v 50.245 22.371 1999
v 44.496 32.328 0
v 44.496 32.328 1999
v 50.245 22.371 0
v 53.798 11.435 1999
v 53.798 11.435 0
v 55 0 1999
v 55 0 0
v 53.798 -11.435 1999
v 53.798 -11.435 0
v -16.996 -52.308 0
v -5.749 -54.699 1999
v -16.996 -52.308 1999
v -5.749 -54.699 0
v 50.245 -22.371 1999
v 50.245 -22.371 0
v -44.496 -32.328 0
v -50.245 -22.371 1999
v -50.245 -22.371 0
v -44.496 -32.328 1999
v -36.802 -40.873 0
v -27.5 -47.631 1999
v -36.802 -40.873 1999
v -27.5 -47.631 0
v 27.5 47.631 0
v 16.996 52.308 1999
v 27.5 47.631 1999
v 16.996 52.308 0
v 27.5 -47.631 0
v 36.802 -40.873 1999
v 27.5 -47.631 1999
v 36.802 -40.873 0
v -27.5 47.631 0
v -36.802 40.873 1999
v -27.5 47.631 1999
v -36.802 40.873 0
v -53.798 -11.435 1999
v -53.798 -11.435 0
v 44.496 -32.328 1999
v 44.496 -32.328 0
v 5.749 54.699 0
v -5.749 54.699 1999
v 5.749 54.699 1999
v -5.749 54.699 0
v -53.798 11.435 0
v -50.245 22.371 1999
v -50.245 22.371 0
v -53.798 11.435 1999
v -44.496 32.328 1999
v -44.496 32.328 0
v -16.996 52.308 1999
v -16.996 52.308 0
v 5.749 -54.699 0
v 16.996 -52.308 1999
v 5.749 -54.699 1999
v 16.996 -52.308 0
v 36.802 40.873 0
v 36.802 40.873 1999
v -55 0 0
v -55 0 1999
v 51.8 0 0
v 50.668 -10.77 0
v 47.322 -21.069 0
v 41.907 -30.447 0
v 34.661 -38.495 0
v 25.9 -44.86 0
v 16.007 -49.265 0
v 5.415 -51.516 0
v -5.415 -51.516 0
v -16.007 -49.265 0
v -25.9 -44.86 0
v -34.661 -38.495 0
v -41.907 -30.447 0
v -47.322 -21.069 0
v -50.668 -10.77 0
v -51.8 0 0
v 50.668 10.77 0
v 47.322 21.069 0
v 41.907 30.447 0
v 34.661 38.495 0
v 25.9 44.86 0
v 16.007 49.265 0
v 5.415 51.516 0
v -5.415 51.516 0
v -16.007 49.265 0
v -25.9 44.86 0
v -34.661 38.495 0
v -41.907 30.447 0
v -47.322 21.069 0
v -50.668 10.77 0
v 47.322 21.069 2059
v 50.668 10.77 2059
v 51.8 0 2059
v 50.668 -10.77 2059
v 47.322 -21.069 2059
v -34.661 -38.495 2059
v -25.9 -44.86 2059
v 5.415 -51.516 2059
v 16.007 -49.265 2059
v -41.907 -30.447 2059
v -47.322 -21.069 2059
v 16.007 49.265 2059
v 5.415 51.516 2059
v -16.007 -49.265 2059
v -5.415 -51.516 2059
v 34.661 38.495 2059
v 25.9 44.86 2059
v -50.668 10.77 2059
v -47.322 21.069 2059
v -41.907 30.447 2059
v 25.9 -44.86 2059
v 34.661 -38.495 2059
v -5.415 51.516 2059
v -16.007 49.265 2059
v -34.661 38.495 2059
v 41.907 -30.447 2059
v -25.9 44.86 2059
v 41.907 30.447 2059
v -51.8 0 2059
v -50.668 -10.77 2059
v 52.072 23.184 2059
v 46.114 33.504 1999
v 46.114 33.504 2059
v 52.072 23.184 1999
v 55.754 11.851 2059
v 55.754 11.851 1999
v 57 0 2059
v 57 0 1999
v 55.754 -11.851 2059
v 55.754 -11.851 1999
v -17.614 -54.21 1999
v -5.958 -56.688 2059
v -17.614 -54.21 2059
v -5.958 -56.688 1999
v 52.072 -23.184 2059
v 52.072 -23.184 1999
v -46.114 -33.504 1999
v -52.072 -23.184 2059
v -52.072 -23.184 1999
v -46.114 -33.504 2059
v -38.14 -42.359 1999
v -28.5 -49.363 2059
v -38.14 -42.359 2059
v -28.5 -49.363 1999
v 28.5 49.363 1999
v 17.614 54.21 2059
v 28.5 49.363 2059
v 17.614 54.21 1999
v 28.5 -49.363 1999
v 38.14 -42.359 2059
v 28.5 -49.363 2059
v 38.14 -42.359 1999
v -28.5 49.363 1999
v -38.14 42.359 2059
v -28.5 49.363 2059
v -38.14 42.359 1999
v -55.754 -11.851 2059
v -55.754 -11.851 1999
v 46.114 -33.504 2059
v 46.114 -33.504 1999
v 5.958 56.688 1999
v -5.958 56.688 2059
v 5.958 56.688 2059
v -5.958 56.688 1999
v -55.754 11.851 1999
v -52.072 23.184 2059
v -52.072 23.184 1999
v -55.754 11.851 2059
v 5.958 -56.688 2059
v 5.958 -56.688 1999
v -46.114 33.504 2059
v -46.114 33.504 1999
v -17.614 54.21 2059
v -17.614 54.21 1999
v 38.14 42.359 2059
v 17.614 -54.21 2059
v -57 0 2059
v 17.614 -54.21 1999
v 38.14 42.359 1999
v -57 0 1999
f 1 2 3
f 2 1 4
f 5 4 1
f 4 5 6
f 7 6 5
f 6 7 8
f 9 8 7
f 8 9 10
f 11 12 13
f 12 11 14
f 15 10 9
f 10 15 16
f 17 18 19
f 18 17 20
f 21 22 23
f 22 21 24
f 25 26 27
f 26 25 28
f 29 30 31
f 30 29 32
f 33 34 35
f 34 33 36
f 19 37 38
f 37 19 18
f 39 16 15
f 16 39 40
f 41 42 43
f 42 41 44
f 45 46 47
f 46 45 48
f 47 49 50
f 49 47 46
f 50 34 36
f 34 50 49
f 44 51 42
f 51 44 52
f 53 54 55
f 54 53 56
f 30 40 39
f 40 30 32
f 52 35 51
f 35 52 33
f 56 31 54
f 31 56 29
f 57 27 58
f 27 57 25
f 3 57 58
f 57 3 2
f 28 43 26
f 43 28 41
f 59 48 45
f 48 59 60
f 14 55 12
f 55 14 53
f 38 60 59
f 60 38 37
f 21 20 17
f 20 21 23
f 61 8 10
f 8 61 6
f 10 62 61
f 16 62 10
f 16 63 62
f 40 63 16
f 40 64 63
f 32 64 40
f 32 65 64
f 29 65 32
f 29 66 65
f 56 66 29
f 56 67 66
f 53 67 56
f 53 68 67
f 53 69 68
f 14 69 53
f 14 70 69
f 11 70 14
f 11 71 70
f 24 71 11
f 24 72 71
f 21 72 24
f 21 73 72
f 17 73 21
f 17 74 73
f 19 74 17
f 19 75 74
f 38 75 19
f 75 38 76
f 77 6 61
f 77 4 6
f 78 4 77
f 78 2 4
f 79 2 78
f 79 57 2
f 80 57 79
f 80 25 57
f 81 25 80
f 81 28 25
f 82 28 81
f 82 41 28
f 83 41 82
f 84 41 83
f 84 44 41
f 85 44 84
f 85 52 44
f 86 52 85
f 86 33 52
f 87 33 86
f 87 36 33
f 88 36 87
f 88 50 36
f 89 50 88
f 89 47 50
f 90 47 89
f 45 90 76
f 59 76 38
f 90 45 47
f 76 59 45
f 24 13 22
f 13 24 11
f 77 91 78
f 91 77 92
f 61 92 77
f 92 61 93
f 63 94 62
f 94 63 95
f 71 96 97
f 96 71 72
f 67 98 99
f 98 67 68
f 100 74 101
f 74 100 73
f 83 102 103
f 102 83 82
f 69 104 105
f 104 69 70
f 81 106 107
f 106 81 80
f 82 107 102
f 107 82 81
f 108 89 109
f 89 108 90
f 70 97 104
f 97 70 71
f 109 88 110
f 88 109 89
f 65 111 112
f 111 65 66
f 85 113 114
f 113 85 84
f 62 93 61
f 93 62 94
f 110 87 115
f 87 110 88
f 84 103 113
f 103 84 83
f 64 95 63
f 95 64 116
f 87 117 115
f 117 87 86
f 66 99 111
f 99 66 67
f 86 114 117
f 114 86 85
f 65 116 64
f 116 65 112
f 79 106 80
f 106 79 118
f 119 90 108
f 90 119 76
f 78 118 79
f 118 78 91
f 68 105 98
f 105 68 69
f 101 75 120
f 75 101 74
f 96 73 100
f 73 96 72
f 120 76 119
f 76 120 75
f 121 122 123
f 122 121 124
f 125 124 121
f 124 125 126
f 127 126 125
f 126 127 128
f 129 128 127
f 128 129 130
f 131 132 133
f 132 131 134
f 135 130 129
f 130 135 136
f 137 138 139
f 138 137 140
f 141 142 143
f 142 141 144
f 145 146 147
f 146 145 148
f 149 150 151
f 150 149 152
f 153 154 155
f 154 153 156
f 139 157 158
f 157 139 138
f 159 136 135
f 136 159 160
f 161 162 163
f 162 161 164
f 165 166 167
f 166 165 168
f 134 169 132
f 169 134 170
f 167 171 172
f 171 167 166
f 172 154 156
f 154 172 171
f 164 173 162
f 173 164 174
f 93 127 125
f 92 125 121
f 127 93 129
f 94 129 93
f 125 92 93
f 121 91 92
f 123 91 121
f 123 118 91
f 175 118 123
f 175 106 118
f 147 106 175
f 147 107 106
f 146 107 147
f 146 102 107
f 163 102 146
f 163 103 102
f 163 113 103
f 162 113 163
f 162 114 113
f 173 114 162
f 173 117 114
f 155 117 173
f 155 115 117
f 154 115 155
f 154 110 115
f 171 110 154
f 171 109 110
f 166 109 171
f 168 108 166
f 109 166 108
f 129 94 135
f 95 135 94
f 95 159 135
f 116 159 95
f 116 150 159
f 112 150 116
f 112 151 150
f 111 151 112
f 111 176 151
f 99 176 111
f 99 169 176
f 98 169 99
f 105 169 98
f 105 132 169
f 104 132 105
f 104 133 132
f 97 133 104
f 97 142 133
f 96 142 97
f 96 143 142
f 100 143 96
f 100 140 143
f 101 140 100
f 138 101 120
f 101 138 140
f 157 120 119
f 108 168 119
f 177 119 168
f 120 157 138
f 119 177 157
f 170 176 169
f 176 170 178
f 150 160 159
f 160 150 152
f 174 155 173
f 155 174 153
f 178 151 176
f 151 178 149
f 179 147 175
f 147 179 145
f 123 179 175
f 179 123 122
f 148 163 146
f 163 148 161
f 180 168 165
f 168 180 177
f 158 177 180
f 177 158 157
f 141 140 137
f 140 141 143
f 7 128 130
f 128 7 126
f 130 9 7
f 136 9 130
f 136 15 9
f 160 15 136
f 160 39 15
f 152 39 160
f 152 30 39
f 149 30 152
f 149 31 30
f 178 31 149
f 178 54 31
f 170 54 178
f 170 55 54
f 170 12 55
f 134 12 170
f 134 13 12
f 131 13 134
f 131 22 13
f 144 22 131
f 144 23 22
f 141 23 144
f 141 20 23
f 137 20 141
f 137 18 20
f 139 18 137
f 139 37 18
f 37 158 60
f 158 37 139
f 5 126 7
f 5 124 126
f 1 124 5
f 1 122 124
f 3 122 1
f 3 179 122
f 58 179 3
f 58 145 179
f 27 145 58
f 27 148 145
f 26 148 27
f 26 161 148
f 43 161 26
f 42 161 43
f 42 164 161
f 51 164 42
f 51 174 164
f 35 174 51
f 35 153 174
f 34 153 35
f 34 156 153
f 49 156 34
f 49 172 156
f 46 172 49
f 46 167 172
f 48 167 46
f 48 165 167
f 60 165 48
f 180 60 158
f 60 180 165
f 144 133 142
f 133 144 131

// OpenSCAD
// Parameters
pipe_standard = 1; //[1:1:1]
nominal_diameter = 110; //[55:220:1]
length_mm = 2000; //[1000:4000:10]
pipe_od = 110; //[55:220:1]
pipe_wall = 3.2; //[1.6:6.4:0.1]
fitting_length = 60; //[30:120:1]
fitting_wall_extra = 2.0; //[1.0:5.0:0.1]
overlap = 1.0; //[0.5:2.0:0.1]

// HT Pipe Segment - Complete Geometry
module ht_pipe() {
  color([0.85, 0.85, 0.8]) { // PVC color
    union() {
      // Main pipe segment
      difference() {
        cylinder(h=length_mm, r=pipe_od/2, center=false);
        translate([0, 0, -overlap/2])
          cylinder(h=length_mm + overlap, r=pipe_od/2 - pipe_wall, center=false);
      }
      // End fitting
      translate([0, 0, length_mm - overlap])
        difference() {
          cylinder(h=fitting_length, r=pipe_od/2 + fitting_wall_extra, center=false);
          translate([0, 0, -overlap/2])
            cylinder(h=fitting_length + overlap, r=pipe_od/2 - pipe_wall, center=false);
        }
    }
  }
}

// Assembly
module assembly() {
  ht_pipe();
}

assembly();
